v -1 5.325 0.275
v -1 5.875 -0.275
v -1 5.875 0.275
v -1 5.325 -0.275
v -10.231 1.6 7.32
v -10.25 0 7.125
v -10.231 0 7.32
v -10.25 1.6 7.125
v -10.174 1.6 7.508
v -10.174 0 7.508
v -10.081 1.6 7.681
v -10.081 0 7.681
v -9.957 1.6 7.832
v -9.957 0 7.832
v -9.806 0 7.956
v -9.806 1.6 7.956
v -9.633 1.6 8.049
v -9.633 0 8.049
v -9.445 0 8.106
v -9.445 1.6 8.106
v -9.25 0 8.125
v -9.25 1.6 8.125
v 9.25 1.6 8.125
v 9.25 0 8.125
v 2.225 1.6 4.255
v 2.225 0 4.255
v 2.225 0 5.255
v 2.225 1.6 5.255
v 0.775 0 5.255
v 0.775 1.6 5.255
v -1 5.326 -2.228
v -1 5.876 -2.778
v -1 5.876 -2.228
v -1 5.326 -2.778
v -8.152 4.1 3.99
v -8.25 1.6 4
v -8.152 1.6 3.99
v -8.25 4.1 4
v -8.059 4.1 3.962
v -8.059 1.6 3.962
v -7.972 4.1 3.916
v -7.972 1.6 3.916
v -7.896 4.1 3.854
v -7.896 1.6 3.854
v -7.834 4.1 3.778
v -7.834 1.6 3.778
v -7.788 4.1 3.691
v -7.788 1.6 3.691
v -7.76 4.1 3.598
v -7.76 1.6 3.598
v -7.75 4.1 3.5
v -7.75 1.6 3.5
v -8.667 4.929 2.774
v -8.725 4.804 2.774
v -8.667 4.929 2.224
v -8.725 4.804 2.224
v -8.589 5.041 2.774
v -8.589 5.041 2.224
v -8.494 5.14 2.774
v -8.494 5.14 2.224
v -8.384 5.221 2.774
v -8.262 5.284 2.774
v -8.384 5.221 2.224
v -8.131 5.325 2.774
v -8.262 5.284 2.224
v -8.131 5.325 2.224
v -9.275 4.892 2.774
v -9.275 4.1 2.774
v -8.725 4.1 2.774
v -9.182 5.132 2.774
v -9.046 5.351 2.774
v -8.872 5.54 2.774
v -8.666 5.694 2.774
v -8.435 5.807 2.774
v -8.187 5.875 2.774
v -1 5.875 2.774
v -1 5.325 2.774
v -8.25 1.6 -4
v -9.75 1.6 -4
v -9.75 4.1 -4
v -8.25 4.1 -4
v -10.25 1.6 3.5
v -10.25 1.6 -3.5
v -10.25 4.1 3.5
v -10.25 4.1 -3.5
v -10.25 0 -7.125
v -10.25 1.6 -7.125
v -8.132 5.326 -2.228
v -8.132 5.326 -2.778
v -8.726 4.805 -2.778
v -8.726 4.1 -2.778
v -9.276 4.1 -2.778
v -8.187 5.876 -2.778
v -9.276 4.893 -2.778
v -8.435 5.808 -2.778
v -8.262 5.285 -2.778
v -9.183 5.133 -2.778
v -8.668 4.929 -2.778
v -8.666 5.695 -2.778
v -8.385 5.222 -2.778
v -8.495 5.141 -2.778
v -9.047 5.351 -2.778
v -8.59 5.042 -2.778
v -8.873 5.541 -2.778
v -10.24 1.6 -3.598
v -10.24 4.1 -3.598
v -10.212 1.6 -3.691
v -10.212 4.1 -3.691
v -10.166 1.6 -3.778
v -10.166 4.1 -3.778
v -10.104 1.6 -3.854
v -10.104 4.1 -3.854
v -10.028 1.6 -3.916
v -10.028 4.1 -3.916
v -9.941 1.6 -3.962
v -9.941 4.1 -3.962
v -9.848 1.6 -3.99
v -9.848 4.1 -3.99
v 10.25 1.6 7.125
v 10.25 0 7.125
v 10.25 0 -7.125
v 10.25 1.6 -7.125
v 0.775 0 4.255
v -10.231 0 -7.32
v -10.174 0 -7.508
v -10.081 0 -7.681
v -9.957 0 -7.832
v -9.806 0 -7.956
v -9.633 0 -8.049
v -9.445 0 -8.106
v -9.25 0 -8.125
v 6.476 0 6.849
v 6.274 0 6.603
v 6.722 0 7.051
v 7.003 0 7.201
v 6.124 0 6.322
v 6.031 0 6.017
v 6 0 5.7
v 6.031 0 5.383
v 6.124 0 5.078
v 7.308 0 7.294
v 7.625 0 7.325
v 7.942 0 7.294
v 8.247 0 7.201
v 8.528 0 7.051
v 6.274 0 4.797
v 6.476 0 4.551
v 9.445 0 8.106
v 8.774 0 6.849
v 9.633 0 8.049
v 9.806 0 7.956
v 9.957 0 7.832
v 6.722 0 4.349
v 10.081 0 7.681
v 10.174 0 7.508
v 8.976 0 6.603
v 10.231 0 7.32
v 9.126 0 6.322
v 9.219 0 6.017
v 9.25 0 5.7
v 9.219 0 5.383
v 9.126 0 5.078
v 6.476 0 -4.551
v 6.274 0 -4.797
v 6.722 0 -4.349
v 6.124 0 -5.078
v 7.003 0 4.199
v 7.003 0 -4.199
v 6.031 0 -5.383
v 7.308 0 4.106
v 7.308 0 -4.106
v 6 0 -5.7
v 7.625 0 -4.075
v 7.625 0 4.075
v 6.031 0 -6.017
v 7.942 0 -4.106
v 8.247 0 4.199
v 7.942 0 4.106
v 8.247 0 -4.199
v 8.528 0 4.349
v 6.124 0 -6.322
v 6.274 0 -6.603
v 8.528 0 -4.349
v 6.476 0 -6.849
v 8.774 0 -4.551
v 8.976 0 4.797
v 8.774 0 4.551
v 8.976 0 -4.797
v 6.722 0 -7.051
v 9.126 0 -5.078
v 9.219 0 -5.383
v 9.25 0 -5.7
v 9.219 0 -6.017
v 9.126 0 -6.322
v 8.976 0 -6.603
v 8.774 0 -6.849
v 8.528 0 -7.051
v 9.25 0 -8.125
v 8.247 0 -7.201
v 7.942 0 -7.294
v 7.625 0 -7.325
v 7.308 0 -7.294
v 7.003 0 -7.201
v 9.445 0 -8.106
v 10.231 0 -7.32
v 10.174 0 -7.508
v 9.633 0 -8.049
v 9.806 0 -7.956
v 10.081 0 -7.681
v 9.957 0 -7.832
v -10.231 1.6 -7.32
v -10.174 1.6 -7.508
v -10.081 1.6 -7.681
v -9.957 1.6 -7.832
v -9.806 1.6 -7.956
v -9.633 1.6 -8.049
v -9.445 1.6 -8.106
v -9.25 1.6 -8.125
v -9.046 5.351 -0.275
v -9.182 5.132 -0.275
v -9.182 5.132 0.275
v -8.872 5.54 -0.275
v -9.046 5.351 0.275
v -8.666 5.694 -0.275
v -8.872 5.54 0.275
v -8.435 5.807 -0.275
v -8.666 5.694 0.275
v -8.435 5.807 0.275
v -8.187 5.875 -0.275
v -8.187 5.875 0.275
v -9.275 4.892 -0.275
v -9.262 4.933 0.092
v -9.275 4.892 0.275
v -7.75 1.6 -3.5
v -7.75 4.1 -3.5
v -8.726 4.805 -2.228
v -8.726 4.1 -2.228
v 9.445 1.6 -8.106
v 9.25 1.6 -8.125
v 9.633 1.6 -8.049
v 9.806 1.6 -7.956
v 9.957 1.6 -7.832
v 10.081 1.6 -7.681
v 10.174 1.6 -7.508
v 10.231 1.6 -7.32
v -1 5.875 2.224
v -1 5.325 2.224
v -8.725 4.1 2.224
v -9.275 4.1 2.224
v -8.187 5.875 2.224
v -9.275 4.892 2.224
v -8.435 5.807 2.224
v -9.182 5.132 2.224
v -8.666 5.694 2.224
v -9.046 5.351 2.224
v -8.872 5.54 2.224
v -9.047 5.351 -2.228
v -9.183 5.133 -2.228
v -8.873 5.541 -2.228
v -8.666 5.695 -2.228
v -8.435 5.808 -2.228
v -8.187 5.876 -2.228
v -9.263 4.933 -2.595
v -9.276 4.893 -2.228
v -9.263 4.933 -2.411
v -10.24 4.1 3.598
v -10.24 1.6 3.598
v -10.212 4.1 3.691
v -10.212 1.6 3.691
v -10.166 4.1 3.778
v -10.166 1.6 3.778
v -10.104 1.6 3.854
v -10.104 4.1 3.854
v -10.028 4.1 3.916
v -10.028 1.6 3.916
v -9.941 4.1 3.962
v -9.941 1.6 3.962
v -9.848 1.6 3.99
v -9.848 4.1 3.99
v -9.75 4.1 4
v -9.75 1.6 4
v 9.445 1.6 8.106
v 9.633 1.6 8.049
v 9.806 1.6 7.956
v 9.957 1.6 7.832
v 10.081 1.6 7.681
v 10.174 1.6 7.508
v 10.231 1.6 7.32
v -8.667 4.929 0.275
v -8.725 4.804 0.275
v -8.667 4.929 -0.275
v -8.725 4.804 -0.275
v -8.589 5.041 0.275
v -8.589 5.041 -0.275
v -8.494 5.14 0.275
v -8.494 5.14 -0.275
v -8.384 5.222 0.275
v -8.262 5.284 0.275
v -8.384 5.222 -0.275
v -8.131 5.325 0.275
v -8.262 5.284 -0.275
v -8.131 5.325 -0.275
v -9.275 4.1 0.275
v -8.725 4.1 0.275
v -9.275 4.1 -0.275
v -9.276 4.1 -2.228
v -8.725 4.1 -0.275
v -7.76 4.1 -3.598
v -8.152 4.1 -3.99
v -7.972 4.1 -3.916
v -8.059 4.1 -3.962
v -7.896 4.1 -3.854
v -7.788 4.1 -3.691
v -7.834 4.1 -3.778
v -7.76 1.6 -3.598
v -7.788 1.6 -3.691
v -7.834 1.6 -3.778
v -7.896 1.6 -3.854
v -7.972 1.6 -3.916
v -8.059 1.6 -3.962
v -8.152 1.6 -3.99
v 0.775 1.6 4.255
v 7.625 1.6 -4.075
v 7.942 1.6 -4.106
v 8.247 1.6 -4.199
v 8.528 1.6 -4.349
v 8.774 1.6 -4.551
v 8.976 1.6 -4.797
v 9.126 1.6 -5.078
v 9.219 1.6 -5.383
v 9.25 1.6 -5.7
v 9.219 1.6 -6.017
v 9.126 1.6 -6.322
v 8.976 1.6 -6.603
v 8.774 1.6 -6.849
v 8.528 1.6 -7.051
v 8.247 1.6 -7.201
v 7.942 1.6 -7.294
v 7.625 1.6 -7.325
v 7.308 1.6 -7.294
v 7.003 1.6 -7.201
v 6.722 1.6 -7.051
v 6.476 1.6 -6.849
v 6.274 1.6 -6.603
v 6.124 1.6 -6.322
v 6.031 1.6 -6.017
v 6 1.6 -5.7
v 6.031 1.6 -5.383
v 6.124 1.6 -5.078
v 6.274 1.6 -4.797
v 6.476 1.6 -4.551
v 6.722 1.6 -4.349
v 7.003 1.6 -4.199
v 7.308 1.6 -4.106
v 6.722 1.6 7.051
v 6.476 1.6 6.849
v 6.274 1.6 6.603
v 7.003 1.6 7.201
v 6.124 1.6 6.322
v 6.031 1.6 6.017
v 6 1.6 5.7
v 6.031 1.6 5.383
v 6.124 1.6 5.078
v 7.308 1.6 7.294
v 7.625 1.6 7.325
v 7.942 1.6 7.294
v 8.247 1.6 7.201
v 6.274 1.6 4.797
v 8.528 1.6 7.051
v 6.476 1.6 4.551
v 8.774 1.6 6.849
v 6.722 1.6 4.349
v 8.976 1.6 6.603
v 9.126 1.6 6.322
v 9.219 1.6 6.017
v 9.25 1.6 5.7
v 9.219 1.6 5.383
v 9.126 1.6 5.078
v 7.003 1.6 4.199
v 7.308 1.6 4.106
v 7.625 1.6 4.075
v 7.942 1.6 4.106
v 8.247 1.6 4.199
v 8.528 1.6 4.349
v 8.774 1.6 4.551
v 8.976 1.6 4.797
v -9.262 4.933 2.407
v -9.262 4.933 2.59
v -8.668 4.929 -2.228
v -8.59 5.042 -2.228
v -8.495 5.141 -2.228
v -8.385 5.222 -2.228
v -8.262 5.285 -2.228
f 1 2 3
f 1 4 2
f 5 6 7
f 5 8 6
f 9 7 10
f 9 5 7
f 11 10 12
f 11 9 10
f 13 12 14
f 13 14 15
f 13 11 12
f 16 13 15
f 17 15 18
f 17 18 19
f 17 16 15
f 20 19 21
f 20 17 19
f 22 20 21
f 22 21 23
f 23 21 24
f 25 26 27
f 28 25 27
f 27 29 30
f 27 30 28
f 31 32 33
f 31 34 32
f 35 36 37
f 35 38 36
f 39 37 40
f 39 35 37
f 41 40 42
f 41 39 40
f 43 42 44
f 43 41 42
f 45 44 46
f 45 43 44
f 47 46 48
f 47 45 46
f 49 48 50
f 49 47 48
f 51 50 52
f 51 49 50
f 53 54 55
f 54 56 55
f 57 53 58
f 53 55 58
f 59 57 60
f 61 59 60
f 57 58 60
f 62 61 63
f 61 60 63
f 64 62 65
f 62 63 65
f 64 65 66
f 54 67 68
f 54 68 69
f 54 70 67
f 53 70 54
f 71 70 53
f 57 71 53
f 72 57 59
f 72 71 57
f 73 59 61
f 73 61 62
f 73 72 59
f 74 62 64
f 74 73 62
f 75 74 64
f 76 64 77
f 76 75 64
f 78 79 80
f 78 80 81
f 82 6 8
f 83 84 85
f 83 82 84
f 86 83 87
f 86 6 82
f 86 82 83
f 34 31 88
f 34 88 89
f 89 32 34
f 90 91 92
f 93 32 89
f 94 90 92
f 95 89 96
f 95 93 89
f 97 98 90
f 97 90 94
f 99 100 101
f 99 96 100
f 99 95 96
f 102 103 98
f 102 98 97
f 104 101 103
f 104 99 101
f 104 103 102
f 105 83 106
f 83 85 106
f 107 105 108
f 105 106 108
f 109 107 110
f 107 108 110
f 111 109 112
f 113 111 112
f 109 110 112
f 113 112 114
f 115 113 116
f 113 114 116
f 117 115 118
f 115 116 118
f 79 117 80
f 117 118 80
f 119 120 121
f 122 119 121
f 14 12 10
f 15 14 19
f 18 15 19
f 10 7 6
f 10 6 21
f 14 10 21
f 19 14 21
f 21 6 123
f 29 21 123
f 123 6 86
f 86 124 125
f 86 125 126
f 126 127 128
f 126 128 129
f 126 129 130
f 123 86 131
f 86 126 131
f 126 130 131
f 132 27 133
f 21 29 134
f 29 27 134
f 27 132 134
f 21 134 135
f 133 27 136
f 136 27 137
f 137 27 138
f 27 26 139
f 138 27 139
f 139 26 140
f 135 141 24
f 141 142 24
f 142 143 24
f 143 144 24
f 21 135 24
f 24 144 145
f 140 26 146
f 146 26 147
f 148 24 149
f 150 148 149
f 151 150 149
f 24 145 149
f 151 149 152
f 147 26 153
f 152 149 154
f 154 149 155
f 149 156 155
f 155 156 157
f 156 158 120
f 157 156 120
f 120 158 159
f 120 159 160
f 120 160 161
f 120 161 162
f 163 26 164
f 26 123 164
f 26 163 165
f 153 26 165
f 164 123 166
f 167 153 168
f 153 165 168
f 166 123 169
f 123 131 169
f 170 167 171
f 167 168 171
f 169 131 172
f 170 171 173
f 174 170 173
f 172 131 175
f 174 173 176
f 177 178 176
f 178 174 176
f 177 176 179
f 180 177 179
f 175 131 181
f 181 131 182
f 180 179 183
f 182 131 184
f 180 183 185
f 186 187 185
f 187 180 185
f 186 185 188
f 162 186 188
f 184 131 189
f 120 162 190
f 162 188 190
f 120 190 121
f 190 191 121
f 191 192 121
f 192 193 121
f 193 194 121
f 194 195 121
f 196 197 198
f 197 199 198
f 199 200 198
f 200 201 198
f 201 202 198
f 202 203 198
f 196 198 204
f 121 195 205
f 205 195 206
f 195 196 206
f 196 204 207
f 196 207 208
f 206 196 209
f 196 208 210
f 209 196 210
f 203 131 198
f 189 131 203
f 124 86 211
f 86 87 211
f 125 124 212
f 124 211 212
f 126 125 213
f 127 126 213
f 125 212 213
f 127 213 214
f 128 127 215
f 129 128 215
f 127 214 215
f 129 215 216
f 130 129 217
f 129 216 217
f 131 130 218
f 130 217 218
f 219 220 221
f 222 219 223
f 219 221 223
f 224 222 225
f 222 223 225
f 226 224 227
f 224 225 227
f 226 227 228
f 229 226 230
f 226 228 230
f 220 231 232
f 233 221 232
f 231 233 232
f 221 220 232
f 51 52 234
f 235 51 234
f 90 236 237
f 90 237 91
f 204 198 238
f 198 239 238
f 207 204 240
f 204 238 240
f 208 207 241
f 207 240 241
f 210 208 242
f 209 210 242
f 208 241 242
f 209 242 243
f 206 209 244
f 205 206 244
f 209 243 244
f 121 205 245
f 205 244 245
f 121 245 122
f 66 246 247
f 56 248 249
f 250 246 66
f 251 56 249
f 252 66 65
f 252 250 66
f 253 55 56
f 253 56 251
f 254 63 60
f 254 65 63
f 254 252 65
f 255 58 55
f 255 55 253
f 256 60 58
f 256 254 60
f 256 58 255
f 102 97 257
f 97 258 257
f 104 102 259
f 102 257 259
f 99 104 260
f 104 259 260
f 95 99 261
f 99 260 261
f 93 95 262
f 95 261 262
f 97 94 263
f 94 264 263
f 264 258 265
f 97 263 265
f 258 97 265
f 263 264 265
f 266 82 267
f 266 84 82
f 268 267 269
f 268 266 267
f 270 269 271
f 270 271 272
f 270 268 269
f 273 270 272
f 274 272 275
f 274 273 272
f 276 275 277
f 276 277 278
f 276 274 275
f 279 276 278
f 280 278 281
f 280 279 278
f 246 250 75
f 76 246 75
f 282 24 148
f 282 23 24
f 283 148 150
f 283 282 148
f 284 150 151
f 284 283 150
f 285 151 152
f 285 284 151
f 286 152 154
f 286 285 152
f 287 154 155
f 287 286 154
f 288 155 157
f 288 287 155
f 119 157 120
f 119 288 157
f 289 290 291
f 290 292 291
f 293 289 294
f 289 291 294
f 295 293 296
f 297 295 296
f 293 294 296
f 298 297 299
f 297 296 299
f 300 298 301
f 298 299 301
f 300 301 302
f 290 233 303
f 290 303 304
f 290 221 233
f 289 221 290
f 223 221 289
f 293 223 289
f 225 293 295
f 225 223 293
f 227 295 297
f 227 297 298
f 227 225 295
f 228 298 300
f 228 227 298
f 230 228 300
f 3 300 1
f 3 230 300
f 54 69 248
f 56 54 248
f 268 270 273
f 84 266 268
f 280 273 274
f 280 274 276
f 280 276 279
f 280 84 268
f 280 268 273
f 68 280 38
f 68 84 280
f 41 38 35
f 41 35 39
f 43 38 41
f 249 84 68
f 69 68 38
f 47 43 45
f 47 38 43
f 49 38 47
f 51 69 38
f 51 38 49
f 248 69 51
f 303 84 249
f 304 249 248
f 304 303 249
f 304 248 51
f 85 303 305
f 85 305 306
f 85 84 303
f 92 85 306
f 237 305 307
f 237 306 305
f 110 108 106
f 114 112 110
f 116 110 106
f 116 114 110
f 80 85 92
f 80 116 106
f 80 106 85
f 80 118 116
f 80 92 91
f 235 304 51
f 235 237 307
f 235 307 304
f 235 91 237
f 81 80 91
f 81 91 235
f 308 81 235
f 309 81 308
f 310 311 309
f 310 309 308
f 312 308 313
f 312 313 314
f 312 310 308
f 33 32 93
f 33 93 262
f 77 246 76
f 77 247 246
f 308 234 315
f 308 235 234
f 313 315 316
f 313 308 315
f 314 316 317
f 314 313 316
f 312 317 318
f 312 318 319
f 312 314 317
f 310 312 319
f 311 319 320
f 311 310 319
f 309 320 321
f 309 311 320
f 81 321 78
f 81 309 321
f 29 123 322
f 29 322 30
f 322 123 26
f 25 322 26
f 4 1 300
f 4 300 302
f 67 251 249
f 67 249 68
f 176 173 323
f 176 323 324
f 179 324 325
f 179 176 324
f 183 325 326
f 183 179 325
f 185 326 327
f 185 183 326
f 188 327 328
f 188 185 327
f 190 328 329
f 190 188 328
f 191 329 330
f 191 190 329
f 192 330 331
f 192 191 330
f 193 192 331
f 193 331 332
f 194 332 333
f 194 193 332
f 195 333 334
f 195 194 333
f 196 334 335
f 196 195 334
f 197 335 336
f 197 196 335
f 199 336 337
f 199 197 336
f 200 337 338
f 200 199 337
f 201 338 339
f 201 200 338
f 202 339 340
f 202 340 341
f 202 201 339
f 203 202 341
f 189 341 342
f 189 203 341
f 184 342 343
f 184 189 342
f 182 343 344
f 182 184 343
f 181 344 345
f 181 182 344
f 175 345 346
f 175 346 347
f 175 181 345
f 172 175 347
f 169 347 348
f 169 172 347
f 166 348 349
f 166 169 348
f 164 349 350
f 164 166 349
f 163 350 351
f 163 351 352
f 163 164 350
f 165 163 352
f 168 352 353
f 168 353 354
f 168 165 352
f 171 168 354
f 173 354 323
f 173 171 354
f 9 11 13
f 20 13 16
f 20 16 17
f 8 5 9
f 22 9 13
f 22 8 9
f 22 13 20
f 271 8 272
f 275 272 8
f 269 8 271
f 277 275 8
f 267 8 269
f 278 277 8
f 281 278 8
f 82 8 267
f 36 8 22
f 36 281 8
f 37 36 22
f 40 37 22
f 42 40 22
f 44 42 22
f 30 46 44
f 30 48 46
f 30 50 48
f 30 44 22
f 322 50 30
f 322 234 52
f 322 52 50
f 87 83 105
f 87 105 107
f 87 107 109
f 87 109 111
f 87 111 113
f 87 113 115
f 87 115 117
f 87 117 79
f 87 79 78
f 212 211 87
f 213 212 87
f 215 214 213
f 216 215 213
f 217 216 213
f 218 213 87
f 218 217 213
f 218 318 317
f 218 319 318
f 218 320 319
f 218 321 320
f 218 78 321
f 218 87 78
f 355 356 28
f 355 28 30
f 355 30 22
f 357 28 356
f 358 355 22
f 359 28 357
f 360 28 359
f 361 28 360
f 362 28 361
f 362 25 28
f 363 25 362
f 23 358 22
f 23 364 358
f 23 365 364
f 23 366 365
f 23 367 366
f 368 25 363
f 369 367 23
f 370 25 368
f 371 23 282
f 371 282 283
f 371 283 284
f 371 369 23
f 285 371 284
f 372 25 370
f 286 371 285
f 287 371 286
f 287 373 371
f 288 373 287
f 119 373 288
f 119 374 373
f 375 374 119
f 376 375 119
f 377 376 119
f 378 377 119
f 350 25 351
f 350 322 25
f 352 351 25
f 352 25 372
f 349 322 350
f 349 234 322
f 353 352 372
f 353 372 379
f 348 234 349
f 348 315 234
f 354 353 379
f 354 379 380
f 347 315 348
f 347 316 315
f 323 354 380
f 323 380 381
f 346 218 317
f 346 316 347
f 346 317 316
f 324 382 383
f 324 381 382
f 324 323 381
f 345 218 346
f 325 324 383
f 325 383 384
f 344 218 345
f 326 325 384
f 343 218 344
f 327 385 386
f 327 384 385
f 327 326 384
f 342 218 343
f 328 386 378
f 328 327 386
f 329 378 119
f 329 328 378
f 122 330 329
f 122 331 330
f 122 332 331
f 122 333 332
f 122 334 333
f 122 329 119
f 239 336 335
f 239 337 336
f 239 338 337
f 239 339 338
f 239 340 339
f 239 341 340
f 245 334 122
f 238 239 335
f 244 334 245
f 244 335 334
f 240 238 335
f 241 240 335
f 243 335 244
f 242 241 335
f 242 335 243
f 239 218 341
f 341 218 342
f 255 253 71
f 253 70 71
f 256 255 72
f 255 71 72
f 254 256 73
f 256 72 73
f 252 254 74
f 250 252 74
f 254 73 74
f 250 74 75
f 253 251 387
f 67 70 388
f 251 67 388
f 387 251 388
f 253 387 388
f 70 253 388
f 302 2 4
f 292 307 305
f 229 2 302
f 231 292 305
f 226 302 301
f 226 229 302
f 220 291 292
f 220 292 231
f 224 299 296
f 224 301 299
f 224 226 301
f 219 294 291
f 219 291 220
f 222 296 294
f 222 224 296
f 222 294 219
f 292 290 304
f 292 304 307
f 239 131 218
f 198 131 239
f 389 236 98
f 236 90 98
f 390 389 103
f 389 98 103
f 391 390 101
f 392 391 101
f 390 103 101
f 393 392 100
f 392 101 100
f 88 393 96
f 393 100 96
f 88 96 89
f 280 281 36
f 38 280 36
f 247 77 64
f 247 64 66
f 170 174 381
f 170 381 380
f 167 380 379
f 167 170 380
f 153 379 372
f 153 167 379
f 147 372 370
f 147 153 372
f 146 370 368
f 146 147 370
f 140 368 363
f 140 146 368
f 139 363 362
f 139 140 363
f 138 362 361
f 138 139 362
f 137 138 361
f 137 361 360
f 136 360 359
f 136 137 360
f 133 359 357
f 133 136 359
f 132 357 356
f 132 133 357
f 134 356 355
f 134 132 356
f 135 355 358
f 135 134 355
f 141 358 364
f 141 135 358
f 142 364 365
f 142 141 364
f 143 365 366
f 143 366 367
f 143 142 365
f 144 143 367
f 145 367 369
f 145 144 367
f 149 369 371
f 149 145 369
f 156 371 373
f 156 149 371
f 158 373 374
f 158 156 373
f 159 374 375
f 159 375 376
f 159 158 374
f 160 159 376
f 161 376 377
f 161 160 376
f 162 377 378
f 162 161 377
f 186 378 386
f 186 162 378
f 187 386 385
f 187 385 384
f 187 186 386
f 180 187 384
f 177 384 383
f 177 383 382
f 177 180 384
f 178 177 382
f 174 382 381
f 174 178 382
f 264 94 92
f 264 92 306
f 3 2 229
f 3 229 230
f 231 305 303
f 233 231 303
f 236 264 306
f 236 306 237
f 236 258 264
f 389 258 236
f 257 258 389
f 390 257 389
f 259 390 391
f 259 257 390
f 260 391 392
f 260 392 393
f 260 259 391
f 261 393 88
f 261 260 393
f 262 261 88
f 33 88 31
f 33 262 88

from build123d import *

# Parameters (mm, degrees)
SKETCH1_W           = 20.5
SKETCH1_H           = 16.25
SKETCH1_R           = 1.625
BOSS_EXTRUDE1_DEPTH = 1.6
FILLET1_R           = 1
SKETCH2_W           = 2.5
SKETCH2_H           = 8
BOSS_EXTRUDE2_DEPTH = 2.5
FILLET2_R           = 0.5
SKETCH8_W           = 0.55
SKETCH8_H           = 0.55
SKETCH9_W           = 0.55
SKETCH9_H           = 0.55
SKETCH12_W          = 0.55
SKETCH12_H          = 0.55
SKETCH13_W          = 1.45
SKETCH13_H          = 1
CUT_EXTRUDE1_DEPTH  = 4


with BuildPart() as part:
    # Sketch1 → Boss-Extrude1 (new body)
    with BuildSketch(Plane(origin=(0, 0, 0), x_dir=(1, 0, 0), z_dir=(0, 1, 0))):
        Rectangle(SKETCH1_W, SKETCH1_H)
        with Locations(Location((7.625, 5.7, 0), (0, 0, 270))):
            Circle(SKETCH1_R, mode=Mode.SUBTRACT)
        with Locations(Location((7.625, -5.7, 0), (0, 0, 90))):
            Circle(SKETCH1_R, mode=Mode.SUBTRACT)
    extrude(amount=BOSS_EXTRUDE1_DEPTH)

    # Fillet1
    fillet1_edges = [part.edges().sort_by_distance(p)[0] for p in [
        (10.25, 0.8, 8.125),
        (-10.25, 0.8, 8.125),
        (-10.25, 0.8, -8.125),
        (10.25, 0.8, -8.125),
    ]]
    fillet(fillet1_edges, radius=FILLET1_R)

    # Sketch2 → Boss-Extrude2 (add)
    with BuildSketch(Plane(origin=(0, 1.6, 0), x_dir=(1, 0, 0), z_dir=(0, 1, 0))):
        with Locations((-9, 0)):
            Rectangle(SKETCH2_W, SKETCH2_H)
    extrude(amount=BOSS_EXTRUDE2_DEPTH)

    # Fillet2
    fillet2_edges = [part.edges().sort_by_distance(p)[0] for p in [
        (-7.75, 2.85, 4),
        (-7.75, 2.85, -4),
        (-10.25, 2.85, -4),
        (-10.25, 2.85, 4),
    ]]
    fillet(fillet2_edges, radius=FILLET2_R)

    # Sweep2: sweep along a path in Sketch5
    with BuildLine(Plane.XY.offset(-2.5)) as sweep2_path:
        Line((-9, 4.1), (-9, 4.85))
        ThreePointArc((-9, 4.85), (-8.682958383, 5.34027213), (-8.160059174, 5.6))
        Line((-8.160059174, 5.6), (-1, 5.6))
    # Sketch8 → Sweep2 (sweep)
    with BuildSketch(Plane(origin=(0, 4.1, 0), x_dir=(1, 0, 0), z_dir=(0, 1, 0))):
        with Locations((-9.001105099, 2.502876889)):
            Rectangle(SKETCH8_W, SKETCH8_H)
    sweep(path=sweep2_path.line, transition=Transition.RIGHT)

    # Sweep3: sweep along a path in Sketch6
    with BuildLine(Plane.XY.offset(2.5)) as sweep3_path:
        Line((-9, 4.1), (-9, 4.85))
        ThreePointArc((-9, 4.85), (-8.682958383, 5.34027213), (-8.160059174, 5.6))
        Line((-8.160059174, 5.6), (-1, 5.6))
    # Sketch9 → Sweep3 (sweep)
    with BuildSketch(Plane(origin=(0, 4.1, 0), x_dir=(1, 0, 0), z_dir=(0, 1, 0))):
        with Locations((-8.999962547, -2.498553748)):
            Rectangle(SKETCH9_W, SKETCH9_H)
    sweep(path=sweep3_path.line, transition=Transition.RIGHT)

    # Sweep4: sweep along a path in Sketch11
    with BuildLine(Plane.XY) as sweep4_path:
        Line((-9, 4.1), (-9, 4.85))
        ThreePointArc((-9, 4.85), (-8.682958383, 5.34027213), (-8.160059174, 5.6))
        Line((-8.160059174, 5.6), (-1, 5.6))
    # Sketch12 → Sweep4 (sweep)
    with BuildSketch(Plane(origin=(0, 4.1, 0), x_dir=(1, 0, 0), z_dir=(0, 1, 0))):
        with Locations((-9, 0)):
            Rectangle(SKETCH12_W, SKETCH12_H)
    sweep(path=sweep4_path.line, transition=Transition.RIGHT)

    # Sketch13 → Cut-Extrude1 (cut)
    with BuildSketch(Plane.XZ):
        with Locations((1.5, 4.755)):
            Rectangle(SKETCH13_W, SKETCH13_H)
    extrude(amount=-CUT_EXTRUDE1_DEPTH, mode=Mode.SUBTRACT)


solid = part.part
